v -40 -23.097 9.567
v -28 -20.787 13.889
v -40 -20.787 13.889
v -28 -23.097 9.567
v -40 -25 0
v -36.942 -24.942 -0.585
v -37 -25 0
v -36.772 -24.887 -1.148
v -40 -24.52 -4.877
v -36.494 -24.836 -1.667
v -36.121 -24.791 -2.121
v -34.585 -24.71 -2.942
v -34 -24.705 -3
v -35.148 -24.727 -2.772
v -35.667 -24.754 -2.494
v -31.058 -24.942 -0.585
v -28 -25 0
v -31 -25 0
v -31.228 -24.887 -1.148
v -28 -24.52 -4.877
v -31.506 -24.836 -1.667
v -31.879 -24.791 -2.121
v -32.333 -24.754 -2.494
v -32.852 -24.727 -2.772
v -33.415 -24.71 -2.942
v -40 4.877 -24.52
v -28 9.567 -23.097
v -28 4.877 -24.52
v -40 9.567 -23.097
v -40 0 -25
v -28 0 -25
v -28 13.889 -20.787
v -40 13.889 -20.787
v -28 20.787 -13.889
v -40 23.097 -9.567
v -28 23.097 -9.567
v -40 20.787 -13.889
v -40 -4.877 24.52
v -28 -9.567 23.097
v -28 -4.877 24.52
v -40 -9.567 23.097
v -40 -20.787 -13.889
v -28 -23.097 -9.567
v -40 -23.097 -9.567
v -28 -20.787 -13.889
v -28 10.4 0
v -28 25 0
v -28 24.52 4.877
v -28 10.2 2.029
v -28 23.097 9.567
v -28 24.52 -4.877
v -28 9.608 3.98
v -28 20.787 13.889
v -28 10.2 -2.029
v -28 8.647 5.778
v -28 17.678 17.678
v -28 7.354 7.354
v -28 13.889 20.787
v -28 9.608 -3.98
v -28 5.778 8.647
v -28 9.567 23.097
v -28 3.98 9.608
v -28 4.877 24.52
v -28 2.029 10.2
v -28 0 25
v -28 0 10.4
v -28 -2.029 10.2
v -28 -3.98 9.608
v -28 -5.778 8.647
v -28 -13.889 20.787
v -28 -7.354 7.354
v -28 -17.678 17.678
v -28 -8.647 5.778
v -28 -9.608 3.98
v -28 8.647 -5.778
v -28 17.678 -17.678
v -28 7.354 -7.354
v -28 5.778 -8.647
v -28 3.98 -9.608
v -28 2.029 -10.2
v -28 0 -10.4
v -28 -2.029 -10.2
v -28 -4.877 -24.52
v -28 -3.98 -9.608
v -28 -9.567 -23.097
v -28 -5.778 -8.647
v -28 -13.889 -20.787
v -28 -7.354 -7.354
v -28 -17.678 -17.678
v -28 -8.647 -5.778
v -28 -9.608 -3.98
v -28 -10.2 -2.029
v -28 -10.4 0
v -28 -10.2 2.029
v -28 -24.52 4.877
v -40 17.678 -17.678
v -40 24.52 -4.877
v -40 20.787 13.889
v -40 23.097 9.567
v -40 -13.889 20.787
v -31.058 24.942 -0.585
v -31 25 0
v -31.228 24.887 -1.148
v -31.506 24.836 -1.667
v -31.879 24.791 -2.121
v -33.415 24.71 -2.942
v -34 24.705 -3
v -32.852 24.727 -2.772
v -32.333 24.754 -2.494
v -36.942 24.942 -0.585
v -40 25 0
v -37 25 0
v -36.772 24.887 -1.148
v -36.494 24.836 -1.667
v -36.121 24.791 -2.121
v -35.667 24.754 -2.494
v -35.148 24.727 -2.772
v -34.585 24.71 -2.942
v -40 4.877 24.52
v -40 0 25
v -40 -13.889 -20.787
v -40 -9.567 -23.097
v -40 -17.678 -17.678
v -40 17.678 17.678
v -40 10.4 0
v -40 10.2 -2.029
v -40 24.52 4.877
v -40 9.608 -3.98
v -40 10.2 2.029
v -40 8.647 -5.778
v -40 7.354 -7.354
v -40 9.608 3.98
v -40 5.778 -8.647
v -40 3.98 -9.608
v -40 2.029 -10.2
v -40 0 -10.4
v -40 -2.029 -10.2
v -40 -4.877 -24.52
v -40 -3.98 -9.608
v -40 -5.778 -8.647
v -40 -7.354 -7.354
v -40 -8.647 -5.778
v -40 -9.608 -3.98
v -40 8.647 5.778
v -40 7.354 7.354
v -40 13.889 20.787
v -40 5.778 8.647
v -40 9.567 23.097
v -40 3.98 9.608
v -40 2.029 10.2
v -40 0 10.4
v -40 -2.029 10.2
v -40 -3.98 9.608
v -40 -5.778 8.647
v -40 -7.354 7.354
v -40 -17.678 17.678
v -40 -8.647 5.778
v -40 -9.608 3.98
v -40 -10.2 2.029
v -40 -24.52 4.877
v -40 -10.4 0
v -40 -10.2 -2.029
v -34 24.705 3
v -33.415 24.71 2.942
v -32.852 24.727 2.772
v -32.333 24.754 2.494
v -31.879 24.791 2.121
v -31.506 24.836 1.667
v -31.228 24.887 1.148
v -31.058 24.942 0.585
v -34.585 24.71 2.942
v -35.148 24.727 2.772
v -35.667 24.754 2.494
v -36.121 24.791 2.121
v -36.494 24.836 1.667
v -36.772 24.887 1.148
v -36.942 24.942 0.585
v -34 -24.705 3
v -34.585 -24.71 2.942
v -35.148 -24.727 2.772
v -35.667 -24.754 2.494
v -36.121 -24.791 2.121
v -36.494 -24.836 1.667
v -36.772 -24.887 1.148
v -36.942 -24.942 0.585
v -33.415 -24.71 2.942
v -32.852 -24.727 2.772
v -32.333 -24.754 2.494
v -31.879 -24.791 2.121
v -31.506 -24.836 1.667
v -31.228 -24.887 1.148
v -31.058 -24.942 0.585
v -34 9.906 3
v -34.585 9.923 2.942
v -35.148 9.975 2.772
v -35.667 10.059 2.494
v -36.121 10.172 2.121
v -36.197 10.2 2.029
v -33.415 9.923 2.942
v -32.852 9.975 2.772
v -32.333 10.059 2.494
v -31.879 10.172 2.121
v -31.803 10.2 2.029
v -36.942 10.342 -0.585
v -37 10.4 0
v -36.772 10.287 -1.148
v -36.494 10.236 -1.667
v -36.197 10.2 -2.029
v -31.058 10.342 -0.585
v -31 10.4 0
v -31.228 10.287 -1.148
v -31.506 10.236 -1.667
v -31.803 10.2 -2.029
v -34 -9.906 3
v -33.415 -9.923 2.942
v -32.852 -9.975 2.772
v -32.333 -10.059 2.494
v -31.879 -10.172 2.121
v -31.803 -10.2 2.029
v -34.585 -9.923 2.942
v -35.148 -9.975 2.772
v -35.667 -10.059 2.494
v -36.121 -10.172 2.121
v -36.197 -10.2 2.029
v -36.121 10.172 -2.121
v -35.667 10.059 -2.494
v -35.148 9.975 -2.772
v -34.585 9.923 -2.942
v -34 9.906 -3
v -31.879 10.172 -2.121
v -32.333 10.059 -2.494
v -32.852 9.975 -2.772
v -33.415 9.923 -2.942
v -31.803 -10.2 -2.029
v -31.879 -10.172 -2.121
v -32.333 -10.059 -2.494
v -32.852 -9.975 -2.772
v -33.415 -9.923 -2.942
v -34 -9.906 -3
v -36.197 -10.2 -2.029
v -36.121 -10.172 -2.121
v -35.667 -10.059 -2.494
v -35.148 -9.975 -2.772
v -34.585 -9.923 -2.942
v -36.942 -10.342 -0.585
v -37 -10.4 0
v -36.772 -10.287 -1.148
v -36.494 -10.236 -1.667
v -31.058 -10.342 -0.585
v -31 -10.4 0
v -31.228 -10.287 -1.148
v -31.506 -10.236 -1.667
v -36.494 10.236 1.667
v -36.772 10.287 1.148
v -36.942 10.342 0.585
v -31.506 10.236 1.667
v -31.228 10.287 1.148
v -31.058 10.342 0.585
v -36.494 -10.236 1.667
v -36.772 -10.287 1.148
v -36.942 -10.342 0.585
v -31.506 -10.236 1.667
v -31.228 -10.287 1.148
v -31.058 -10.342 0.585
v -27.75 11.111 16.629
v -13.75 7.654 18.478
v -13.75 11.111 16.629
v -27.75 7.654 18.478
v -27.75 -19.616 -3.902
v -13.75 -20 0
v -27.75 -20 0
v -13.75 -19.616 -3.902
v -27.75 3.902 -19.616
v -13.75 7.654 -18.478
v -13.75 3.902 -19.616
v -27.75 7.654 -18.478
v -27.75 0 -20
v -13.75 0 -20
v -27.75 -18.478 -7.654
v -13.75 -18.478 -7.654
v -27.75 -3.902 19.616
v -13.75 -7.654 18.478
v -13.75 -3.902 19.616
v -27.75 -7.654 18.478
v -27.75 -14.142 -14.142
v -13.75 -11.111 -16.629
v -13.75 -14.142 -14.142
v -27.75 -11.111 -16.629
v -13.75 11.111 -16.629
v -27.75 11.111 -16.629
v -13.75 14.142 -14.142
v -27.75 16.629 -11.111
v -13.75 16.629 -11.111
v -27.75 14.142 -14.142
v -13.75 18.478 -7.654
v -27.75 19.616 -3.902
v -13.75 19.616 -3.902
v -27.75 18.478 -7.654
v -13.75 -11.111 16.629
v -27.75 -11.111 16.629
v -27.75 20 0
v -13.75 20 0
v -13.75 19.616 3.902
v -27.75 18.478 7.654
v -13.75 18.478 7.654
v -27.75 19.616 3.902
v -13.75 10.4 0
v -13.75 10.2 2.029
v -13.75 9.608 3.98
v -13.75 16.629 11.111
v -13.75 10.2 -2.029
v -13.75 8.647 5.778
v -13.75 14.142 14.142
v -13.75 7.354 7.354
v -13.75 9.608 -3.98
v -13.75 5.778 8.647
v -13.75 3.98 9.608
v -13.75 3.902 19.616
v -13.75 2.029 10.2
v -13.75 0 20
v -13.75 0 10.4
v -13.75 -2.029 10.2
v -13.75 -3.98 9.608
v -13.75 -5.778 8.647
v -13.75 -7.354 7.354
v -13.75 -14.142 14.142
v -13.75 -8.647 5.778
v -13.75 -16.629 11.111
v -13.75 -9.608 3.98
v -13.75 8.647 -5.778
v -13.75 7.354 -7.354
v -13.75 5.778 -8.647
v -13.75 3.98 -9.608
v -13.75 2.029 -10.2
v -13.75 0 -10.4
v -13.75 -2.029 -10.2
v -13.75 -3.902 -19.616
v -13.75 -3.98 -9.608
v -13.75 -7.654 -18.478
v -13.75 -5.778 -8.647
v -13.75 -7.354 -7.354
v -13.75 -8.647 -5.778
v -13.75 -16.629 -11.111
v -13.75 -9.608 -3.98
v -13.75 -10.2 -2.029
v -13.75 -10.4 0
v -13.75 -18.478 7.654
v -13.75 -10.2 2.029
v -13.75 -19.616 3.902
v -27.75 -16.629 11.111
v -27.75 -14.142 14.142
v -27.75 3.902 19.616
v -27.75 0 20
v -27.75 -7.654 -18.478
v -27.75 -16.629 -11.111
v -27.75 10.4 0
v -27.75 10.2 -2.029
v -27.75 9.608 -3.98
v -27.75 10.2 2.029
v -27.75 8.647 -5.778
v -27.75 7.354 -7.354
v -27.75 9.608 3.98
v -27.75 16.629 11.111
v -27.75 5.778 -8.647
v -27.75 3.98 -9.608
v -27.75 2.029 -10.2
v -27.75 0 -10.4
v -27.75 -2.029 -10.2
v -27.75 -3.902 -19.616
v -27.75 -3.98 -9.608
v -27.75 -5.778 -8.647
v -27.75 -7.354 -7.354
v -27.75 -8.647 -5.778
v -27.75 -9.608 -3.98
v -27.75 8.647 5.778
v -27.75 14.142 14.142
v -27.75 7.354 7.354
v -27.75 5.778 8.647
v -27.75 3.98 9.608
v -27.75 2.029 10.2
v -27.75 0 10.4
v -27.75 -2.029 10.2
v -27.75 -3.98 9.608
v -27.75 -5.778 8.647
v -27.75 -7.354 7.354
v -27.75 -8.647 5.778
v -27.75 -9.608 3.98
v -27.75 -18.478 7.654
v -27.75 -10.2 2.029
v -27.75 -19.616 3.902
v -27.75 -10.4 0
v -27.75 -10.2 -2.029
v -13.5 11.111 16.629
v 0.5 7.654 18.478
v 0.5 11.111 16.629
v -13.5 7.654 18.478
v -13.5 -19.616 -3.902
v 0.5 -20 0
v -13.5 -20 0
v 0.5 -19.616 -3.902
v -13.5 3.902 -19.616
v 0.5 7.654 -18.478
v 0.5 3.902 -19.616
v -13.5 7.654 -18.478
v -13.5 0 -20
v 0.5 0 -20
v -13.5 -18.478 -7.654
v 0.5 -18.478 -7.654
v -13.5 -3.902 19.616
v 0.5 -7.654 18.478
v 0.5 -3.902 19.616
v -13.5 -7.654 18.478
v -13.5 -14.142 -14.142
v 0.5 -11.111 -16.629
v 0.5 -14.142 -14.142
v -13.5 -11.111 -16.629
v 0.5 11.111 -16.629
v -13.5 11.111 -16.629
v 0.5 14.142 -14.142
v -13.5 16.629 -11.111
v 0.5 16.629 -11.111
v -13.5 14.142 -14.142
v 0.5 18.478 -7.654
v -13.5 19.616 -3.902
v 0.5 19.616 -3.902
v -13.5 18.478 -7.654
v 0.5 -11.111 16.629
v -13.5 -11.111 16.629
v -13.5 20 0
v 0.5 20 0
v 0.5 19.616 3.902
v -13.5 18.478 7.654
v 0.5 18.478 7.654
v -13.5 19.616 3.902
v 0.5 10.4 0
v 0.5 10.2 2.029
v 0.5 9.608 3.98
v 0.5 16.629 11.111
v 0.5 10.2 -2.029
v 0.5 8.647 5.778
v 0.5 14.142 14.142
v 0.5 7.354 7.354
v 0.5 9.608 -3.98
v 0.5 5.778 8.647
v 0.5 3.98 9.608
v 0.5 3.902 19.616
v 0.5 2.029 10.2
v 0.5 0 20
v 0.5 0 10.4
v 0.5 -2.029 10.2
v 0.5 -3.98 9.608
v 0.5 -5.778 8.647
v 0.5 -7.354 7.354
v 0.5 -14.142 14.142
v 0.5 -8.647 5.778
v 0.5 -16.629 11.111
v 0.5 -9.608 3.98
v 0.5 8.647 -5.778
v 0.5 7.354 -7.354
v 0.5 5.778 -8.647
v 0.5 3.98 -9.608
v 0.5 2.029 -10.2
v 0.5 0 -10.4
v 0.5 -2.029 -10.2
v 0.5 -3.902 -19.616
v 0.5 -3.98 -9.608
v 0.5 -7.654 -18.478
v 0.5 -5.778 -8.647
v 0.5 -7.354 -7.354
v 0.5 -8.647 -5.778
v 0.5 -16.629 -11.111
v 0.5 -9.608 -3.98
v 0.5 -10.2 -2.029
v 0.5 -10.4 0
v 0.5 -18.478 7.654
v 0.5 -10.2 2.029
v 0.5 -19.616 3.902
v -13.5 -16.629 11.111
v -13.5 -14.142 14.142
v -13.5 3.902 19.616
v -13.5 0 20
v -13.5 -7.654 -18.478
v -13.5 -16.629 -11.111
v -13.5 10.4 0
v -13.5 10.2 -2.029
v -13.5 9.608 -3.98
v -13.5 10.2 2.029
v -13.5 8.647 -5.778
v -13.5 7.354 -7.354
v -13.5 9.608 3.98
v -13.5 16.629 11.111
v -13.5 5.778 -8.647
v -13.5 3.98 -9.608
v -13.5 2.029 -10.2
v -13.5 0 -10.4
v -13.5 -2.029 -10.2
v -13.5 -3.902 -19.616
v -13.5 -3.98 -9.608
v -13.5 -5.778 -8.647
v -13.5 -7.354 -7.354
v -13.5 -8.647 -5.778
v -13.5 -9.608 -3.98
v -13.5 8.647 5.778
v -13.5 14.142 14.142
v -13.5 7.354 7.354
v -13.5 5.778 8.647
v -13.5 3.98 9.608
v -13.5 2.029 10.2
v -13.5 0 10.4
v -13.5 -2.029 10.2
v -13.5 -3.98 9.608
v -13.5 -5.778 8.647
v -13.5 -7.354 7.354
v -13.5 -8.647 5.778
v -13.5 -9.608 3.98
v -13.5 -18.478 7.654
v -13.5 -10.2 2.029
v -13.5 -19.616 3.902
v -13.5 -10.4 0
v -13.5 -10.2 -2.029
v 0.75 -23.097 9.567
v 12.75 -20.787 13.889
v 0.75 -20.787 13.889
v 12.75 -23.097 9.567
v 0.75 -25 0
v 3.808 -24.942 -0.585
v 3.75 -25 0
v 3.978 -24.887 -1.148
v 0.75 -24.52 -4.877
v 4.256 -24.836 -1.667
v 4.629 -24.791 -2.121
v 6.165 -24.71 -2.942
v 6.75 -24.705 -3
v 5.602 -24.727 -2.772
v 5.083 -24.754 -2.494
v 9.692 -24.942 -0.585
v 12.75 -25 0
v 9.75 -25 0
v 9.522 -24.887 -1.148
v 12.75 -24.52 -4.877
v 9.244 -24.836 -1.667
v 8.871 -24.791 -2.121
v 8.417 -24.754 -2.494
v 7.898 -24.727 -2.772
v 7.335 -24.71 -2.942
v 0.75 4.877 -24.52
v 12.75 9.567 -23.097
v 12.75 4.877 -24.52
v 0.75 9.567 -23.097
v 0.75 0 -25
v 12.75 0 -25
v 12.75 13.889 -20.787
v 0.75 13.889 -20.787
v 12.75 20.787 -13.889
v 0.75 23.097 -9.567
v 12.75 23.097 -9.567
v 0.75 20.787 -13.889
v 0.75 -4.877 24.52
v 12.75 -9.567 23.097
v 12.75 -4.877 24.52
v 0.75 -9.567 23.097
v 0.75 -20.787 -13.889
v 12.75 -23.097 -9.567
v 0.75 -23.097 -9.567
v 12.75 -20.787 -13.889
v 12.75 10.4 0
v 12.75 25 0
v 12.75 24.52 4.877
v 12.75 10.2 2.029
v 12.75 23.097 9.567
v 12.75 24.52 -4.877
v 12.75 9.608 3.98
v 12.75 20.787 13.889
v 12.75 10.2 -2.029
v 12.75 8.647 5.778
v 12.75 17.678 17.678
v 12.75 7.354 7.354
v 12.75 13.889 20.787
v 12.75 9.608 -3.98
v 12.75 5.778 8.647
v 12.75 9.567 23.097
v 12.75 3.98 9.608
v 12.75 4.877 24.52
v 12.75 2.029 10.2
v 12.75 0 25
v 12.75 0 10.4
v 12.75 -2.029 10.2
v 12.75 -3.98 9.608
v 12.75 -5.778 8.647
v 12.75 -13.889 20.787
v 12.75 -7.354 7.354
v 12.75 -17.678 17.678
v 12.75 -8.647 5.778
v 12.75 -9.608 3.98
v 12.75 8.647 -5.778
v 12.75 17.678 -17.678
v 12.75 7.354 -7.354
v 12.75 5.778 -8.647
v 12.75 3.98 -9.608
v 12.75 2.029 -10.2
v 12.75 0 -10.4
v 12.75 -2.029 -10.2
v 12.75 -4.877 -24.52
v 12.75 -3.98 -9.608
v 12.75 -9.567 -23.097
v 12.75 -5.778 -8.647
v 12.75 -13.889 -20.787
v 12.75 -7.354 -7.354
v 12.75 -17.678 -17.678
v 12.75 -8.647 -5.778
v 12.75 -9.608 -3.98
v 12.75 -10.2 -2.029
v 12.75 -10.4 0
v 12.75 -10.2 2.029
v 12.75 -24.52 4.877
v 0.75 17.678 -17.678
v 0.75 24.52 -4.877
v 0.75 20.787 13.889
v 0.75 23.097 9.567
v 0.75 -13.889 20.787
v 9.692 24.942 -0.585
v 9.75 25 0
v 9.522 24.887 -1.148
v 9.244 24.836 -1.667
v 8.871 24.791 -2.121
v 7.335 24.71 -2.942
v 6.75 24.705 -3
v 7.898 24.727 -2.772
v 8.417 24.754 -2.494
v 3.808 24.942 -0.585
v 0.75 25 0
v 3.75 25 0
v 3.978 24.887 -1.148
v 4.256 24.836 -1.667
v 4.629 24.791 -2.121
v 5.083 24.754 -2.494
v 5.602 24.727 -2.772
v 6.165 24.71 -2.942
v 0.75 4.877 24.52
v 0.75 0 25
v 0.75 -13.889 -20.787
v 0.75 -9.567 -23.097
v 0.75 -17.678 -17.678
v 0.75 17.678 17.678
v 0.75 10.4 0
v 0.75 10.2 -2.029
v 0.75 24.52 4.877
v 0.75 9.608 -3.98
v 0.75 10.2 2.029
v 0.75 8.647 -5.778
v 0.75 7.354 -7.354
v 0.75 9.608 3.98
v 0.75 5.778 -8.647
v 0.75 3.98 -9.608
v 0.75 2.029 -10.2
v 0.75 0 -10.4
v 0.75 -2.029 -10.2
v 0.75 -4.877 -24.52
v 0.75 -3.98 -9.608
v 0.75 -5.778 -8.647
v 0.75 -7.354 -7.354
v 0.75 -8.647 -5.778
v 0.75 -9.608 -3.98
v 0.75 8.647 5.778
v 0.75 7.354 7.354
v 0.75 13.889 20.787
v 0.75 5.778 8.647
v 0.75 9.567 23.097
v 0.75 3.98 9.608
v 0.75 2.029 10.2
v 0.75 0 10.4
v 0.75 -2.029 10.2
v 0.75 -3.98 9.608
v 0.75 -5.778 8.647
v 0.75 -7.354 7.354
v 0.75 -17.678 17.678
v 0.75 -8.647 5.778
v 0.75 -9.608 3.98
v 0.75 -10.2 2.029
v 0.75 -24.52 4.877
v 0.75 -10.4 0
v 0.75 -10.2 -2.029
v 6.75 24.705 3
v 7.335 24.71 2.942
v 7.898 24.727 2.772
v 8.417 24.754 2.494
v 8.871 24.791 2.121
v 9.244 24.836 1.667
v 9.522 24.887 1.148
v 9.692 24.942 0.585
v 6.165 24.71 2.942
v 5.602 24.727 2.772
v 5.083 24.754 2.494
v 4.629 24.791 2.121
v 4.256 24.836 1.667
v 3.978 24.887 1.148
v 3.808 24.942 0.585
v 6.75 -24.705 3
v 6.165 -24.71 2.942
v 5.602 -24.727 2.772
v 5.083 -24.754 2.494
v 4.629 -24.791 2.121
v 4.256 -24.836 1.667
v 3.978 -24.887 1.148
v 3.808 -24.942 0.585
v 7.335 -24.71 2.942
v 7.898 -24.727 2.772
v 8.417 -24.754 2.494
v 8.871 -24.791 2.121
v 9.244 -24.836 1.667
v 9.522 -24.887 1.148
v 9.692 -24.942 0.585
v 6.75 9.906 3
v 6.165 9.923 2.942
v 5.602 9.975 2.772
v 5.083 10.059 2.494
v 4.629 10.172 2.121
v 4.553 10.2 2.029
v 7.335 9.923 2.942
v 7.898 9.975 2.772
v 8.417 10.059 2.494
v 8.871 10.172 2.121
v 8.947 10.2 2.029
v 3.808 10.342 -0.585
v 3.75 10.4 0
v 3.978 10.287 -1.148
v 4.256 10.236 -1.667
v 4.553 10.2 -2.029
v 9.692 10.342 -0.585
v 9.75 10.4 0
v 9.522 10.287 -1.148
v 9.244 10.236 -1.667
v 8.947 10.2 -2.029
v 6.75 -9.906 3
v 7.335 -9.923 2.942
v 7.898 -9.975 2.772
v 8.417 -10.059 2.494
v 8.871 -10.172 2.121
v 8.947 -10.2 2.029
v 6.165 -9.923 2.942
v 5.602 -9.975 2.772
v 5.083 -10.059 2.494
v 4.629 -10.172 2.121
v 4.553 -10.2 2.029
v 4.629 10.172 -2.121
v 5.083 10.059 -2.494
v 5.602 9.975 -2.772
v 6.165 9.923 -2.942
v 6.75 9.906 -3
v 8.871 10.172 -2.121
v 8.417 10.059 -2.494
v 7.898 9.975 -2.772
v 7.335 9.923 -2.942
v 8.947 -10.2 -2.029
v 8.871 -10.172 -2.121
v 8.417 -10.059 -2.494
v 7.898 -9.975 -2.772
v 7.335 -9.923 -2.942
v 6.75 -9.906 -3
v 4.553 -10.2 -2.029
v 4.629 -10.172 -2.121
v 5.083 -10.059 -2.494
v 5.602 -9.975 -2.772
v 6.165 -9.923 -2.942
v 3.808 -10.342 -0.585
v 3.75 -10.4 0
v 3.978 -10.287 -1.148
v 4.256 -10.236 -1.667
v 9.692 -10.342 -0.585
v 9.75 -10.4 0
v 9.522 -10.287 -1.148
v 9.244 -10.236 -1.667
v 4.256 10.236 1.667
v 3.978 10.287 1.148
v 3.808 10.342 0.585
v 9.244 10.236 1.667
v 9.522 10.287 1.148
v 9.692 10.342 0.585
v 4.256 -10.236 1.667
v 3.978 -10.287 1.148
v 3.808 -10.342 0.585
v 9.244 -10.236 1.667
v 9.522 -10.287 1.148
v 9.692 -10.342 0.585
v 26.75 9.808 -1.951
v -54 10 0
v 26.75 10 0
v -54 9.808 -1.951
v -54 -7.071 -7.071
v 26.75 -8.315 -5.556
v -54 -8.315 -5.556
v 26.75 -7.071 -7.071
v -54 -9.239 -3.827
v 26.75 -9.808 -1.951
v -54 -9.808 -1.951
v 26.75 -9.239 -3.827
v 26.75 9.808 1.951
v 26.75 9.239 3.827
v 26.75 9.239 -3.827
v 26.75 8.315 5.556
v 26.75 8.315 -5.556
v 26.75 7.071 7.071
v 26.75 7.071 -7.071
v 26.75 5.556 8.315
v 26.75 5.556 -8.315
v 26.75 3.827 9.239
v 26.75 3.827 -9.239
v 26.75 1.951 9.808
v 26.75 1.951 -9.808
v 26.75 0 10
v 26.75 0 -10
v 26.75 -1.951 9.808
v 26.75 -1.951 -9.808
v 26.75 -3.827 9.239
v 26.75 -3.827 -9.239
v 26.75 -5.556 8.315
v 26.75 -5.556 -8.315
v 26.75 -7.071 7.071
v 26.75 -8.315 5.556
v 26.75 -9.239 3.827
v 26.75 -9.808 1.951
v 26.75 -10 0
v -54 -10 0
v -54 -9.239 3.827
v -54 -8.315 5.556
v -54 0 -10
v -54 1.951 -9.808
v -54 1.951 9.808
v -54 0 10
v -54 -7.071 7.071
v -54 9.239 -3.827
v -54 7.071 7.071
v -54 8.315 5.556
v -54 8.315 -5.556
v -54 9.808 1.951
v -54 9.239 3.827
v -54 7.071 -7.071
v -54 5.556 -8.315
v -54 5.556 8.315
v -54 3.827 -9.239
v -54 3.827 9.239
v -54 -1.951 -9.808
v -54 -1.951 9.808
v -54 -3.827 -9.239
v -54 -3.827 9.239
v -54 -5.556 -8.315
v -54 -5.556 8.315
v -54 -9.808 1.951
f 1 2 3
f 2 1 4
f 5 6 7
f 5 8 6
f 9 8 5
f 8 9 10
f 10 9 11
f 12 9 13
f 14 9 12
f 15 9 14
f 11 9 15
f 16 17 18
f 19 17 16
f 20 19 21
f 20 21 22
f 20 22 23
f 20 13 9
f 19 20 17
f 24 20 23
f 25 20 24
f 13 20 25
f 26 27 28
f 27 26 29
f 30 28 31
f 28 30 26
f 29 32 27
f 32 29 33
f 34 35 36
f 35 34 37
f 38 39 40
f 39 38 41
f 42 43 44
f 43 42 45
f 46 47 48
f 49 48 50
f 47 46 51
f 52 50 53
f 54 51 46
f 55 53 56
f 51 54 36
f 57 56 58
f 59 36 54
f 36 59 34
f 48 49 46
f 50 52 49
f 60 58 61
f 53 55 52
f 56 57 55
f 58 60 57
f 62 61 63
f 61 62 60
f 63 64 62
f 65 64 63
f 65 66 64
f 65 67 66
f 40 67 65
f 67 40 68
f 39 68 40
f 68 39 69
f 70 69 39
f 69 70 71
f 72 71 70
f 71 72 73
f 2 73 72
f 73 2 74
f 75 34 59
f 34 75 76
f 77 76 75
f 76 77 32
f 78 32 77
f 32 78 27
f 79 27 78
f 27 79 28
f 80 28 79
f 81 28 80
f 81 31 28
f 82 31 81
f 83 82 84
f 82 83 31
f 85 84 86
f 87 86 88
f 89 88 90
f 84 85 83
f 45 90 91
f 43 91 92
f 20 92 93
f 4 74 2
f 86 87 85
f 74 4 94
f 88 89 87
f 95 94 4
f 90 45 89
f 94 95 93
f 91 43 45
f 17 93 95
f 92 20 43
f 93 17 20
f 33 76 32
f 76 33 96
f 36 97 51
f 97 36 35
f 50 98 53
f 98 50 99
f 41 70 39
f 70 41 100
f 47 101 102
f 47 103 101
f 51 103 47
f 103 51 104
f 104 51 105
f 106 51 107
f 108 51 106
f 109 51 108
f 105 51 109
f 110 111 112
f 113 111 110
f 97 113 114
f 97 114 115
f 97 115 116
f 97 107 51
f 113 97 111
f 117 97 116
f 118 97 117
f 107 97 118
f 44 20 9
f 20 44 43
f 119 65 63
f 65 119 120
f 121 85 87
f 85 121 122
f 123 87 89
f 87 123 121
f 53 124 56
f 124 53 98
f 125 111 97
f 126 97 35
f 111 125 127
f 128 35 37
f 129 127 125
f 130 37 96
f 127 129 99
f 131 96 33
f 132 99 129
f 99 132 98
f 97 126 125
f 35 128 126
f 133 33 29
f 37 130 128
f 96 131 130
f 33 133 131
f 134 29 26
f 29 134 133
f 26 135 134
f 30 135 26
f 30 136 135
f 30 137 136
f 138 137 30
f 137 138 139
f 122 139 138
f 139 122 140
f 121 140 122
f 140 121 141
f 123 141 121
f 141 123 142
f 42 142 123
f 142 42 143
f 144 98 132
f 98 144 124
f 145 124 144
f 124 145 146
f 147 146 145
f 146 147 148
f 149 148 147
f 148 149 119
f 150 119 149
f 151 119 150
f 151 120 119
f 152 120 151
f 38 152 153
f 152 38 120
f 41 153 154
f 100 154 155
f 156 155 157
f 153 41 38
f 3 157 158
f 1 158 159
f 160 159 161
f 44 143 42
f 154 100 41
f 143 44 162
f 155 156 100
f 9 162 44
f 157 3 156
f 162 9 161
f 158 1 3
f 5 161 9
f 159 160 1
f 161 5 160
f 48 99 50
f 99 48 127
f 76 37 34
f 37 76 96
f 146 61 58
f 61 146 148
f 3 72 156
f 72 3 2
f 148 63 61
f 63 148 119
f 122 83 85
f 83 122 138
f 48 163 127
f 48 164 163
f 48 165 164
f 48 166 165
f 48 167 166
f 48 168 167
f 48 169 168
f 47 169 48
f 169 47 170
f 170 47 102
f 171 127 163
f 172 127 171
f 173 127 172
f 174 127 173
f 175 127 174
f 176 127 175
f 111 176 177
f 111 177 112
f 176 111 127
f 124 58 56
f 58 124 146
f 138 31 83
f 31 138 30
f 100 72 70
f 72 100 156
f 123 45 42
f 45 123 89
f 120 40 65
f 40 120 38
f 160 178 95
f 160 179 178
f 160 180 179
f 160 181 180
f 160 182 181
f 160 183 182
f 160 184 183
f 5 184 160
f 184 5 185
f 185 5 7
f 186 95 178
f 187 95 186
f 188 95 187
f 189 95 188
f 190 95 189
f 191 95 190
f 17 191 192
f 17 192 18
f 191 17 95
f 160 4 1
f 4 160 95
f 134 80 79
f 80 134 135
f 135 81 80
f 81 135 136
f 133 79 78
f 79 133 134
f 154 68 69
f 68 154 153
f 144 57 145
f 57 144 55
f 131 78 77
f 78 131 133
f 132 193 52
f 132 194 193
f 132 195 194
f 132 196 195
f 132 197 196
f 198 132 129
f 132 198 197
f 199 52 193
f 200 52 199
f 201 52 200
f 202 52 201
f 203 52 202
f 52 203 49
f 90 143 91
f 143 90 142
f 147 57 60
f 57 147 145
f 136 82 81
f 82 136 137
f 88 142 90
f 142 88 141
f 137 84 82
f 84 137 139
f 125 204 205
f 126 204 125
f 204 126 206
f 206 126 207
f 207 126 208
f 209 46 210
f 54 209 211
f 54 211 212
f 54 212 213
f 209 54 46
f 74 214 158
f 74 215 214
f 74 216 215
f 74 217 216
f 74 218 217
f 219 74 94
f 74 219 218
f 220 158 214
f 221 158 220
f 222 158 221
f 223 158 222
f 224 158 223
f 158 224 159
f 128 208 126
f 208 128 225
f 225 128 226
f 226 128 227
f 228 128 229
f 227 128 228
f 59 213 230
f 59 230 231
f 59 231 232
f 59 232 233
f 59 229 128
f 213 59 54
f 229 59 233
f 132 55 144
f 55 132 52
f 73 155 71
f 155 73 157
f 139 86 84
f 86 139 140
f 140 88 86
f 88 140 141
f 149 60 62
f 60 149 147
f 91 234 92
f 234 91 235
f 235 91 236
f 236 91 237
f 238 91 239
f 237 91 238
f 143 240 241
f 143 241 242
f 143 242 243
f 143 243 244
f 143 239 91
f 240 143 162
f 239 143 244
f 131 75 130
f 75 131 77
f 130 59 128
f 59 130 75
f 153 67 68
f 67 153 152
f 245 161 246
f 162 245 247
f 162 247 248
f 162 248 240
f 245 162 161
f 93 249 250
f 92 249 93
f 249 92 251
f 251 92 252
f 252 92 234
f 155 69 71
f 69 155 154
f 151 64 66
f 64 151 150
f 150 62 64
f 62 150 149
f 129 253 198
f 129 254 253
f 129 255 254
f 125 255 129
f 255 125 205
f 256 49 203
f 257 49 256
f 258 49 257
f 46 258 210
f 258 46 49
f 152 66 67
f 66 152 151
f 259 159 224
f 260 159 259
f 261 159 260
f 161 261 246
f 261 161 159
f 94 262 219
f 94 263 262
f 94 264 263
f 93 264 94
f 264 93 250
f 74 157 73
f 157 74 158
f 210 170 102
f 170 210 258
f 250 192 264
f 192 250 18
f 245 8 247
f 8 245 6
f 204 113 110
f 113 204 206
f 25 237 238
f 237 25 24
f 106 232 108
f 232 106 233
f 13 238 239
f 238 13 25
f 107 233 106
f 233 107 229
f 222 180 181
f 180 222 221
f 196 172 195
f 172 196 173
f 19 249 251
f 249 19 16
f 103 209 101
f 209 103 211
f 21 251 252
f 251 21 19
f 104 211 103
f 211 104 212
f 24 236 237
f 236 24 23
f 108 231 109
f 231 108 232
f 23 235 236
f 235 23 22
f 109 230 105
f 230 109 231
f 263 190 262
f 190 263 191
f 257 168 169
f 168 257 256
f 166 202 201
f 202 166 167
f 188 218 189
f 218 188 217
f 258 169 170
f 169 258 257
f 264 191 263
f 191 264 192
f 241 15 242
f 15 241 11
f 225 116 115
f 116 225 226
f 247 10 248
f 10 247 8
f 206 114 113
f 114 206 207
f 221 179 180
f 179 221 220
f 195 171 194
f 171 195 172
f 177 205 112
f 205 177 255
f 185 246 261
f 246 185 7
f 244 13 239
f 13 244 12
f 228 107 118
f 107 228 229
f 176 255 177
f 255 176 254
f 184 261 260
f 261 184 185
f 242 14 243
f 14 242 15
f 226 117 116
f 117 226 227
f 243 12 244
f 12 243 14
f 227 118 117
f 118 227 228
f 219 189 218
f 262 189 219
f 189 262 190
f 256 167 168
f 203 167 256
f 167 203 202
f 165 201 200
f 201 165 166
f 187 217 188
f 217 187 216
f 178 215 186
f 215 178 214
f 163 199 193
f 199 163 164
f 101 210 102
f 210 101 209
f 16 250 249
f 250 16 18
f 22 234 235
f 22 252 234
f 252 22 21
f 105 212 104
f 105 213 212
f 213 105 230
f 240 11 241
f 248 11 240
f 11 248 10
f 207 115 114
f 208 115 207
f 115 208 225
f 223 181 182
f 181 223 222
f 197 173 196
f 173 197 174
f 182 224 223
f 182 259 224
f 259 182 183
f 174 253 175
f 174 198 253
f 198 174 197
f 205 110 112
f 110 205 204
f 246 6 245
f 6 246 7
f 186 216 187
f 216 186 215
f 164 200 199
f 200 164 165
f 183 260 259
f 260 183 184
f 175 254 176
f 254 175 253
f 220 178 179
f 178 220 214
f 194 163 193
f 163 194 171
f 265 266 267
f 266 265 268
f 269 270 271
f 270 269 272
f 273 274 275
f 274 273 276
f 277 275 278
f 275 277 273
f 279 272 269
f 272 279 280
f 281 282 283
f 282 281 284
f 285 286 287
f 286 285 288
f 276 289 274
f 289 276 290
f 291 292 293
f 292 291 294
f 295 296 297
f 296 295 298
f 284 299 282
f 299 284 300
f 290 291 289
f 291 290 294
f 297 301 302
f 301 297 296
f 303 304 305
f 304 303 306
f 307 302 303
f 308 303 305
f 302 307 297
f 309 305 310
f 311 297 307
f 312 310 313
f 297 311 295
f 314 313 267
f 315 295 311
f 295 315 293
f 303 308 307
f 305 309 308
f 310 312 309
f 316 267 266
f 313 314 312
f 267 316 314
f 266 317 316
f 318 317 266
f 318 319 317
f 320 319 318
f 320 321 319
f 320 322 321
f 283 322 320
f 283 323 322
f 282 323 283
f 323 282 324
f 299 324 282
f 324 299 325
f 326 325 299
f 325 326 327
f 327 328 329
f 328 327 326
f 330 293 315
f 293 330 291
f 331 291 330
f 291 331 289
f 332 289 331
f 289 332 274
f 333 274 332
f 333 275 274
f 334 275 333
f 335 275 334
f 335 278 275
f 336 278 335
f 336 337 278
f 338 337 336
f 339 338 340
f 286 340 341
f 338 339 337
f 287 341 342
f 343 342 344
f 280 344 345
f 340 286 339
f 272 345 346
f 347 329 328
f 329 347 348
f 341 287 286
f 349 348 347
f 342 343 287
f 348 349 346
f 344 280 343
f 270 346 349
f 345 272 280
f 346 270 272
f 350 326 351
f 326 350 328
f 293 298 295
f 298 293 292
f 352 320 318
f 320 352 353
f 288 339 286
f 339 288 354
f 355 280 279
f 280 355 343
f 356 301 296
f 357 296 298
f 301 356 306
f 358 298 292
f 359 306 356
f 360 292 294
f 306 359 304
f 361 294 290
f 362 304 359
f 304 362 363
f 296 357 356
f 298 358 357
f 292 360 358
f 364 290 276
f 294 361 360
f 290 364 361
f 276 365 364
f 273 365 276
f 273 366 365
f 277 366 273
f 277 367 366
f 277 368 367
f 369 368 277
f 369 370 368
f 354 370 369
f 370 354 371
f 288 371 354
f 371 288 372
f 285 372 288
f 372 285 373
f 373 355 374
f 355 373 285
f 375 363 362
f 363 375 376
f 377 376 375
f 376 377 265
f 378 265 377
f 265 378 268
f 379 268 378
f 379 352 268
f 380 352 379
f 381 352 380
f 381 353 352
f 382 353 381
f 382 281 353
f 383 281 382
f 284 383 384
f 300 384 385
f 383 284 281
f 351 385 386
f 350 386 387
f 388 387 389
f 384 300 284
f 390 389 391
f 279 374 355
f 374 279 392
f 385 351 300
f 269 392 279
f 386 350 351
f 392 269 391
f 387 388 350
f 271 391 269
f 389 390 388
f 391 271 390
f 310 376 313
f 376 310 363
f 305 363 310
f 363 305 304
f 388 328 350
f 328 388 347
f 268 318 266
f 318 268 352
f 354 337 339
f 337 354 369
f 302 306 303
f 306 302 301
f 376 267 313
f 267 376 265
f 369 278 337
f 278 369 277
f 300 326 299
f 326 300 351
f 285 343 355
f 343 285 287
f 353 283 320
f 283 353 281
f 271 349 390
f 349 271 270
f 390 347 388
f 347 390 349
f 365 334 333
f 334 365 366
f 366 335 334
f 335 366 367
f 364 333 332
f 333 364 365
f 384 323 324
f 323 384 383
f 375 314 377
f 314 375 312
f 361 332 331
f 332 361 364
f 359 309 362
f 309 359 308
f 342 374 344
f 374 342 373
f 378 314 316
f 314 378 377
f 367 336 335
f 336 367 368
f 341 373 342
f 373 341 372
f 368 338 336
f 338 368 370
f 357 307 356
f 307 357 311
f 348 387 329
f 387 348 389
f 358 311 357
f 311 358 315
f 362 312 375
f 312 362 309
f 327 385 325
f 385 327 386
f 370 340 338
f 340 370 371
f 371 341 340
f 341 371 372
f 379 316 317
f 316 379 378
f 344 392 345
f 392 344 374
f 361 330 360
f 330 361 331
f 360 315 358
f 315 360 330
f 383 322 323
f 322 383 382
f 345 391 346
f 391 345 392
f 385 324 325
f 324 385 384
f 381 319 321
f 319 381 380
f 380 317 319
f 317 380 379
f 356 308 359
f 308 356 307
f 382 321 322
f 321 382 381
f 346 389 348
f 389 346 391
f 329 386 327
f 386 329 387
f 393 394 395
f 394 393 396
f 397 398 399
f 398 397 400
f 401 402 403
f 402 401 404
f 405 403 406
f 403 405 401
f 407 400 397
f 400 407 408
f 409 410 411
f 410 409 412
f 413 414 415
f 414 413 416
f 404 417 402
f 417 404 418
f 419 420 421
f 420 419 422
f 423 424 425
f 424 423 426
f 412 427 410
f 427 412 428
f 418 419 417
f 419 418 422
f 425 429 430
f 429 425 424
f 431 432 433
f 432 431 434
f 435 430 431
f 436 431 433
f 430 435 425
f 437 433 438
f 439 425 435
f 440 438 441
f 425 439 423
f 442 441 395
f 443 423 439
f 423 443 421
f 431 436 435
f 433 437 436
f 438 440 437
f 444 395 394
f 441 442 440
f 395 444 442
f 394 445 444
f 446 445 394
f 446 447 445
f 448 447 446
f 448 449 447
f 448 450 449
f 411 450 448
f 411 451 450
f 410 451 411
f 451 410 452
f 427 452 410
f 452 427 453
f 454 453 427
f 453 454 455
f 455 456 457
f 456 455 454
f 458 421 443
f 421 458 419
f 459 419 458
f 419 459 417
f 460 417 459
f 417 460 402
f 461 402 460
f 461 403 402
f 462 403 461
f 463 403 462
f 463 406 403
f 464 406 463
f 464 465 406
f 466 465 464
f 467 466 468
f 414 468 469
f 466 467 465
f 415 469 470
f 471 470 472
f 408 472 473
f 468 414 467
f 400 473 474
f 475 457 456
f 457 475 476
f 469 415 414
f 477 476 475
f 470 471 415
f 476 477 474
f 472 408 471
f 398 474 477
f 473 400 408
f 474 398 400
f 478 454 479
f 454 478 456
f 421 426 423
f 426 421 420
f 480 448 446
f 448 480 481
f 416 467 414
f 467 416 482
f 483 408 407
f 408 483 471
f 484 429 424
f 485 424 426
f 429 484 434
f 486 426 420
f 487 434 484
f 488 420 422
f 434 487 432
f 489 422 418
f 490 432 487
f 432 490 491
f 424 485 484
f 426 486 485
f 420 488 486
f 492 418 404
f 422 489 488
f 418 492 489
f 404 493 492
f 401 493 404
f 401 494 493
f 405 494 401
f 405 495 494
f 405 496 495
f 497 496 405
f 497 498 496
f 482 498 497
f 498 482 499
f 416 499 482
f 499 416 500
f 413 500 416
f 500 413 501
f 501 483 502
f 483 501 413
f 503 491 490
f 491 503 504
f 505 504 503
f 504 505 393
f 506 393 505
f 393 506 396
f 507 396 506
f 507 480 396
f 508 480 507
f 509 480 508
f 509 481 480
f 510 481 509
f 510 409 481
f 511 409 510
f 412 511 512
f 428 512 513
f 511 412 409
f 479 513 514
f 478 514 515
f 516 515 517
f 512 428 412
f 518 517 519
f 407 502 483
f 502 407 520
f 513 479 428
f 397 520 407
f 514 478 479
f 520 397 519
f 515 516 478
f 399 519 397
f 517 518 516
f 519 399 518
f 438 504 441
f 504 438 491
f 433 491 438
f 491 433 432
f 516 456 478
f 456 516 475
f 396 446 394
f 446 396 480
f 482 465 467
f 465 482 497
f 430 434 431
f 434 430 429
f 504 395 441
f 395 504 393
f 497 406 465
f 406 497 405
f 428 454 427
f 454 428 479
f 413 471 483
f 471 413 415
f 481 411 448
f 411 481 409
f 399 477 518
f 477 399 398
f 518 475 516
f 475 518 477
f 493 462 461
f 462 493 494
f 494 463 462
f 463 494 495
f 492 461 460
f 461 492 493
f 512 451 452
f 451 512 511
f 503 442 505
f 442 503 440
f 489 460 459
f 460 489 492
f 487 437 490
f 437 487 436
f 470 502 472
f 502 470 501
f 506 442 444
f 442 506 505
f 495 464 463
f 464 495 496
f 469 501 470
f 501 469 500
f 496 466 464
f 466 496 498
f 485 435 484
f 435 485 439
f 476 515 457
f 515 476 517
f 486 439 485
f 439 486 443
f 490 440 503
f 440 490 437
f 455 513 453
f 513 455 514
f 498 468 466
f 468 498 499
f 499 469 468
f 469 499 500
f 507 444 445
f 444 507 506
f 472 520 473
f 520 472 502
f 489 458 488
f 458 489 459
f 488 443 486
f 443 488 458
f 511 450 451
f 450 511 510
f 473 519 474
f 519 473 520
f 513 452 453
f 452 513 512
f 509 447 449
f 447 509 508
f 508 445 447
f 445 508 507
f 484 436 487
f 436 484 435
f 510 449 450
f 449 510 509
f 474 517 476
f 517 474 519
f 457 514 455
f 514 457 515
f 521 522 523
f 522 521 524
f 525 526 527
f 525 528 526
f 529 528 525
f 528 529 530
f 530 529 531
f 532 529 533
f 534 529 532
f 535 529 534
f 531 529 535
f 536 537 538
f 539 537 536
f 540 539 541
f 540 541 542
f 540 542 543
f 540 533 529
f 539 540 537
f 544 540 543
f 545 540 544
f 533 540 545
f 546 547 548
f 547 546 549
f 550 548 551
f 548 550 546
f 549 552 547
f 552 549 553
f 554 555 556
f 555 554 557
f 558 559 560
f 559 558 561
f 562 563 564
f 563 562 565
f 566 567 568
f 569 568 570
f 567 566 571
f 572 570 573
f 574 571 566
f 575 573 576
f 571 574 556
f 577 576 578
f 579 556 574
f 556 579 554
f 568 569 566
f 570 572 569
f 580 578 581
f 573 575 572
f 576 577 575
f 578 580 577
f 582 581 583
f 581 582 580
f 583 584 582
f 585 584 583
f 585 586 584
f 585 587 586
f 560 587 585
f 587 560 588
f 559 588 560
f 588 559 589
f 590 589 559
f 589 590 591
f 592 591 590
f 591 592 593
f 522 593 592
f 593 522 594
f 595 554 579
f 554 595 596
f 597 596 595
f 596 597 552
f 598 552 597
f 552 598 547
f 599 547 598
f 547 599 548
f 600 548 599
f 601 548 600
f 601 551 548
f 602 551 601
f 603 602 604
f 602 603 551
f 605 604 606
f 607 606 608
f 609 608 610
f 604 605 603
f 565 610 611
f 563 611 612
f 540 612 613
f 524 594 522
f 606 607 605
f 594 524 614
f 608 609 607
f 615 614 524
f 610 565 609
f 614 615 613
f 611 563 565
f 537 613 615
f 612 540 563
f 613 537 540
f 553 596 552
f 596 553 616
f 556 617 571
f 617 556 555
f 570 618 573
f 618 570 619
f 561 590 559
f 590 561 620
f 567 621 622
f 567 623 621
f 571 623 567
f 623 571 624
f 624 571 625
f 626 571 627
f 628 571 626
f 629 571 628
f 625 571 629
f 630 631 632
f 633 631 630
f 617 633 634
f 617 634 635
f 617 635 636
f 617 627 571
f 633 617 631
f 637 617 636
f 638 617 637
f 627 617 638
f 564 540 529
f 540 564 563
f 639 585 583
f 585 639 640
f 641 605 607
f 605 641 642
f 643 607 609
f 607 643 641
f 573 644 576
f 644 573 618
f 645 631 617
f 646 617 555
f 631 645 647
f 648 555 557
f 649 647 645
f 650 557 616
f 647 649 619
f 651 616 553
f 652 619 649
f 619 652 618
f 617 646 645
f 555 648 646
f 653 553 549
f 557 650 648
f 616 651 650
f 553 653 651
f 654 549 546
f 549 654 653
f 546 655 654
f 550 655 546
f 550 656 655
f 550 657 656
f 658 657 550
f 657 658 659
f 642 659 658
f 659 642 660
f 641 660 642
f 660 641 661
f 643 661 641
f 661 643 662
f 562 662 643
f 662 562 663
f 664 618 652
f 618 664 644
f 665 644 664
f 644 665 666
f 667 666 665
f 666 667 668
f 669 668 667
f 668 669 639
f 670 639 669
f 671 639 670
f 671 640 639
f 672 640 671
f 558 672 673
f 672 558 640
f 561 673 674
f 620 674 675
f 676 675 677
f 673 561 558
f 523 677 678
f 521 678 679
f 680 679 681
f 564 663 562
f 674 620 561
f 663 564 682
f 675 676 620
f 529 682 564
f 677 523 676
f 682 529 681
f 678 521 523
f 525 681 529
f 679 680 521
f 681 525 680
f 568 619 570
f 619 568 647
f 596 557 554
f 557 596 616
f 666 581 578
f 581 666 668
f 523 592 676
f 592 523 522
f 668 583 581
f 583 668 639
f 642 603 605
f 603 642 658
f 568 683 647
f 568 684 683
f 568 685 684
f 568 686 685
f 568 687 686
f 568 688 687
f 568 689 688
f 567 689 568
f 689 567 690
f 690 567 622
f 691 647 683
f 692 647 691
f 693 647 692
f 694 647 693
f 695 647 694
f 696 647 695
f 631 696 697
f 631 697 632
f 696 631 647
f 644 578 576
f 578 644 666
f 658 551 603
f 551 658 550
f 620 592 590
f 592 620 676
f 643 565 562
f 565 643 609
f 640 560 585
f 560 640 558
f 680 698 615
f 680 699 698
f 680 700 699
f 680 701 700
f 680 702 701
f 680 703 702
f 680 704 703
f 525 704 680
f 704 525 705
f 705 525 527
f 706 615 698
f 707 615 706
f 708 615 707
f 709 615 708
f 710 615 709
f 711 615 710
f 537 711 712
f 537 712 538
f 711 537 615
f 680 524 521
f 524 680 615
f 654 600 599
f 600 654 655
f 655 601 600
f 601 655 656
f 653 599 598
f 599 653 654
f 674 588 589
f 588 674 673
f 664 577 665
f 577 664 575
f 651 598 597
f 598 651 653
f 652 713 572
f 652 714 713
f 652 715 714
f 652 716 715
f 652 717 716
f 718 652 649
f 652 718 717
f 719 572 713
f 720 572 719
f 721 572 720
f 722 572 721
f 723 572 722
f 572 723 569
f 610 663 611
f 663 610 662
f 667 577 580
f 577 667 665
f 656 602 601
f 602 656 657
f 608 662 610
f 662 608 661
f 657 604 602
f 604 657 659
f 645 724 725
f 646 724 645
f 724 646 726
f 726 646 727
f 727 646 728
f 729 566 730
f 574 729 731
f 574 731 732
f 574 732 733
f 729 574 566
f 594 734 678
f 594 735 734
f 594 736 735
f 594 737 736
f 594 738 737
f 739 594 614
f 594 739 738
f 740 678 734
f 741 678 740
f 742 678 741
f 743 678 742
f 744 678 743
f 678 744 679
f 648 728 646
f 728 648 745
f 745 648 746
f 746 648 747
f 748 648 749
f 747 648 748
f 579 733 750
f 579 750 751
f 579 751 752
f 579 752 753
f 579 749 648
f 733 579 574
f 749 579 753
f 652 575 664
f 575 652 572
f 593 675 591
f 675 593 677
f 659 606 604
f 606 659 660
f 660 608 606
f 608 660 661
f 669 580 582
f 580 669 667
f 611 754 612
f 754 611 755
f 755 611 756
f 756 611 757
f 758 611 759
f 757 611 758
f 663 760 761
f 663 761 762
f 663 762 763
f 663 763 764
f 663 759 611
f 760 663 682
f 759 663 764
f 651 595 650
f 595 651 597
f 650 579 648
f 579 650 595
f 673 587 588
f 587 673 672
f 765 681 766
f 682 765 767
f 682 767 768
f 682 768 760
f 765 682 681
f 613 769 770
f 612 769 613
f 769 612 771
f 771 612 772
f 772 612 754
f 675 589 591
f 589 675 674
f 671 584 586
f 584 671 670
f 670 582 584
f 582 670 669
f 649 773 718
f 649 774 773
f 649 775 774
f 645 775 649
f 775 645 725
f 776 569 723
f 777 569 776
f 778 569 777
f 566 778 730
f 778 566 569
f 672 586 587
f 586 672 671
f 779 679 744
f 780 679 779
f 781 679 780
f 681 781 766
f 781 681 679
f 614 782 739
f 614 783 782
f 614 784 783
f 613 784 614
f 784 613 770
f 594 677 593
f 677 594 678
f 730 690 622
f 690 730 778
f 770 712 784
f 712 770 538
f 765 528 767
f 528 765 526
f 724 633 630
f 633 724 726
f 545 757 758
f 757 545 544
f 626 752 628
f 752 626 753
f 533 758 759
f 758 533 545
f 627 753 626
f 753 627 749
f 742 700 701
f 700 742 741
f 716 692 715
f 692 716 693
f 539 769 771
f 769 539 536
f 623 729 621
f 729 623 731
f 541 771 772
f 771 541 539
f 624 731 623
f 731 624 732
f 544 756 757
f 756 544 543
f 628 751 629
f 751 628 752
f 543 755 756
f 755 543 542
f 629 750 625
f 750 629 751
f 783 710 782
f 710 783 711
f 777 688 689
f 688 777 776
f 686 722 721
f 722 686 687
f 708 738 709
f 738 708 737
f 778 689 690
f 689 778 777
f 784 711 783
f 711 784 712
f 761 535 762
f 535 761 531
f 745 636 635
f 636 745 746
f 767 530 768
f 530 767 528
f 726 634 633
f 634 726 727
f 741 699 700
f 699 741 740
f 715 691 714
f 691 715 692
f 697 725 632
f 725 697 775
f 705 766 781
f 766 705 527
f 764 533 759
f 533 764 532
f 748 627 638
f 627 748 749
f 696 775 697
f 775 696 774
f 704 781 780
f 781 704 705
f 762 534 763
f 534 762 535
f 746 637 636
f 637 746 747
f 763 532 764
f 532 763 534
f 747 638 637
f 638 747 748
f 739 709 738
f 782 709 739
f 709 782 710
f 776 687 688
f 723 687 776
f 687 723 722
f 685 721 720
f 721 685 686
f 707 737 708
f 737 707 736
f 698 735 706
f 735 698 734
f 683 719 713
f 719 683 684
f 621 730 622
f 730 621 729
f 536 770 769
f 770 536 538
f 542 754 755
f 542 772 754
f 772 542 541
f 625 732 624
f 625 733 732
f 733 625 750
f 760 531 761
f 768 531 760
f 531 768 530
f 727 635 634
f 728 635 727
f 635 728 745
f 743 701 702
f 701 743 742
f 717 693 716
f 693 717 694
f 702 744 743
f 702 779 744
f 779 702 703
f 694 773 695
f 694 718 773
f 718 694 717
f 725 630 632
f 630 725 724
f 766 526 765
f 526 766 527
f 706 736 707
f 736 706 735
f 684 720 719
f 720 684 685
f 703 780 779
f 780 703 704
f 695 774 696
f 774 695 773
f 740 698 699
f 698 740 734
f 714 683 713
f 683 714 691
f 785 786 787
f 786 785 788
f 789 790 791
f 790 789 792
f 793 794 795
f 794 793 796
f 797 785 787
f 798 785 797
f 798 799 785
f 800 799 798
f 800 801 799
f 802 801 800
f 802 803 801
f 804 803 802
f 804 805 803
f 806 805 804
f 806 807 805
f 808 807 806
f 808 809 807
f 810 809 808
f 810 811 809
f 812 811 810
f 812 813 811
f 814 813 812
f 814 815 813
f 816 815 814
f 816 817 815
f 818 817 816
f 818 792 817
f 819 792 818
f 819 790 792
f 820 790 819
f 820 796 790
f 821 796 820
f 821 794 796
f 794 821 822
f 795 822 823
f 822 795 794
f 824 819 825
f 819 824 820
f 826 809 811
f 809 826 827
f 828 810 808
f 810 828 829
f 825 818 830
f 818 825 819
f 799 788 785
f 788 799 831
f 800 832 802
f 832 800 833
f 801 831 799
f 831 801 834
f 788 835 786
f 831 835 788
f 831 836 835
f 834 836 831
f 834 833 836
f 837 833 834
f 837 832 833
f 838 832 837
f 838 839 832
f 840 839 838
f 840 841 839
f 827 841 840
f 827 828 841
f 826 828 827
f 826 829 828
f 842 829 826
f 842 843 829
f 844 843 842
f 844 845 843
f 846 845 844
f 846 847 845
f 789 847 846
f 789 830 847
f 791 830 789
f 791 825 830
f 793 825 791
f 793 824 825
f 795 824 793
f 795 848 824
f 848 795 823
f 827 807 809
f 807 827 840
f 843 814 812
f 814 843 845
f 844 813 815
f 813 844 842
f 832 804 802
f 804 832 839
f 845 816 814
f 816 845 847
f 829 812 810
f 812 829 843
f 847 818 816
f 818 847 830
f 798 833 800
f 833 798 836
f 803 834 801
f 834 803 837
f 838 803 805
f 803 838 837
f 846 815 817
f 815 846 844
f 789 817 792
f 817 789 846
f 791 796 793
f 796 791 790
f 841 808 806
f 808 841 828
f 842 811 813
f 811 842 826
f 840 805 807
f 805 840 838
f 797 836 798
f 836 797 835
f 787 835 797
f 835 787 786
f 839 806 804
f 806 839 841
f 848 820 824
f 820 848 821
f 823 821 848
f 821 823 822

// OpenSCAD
$fn = 32;

// ------------------------------------------------------------------------
// Shaft with rings and collars: d20 shaft, 4 rings
// Every part is its own module, assembly() places them once.
// ------------------------------------------------------------------------

// --- part 1 ---
module shaft() {
  translate([0, 0, -40.375]) cylinder(h = 80.75, d = 20);
}

// --- part 2 ---
module collar_a() {
  difference() {
    cylinder(h = 12, d = 50);
    translate([0, 0, -1]) cylinder(h = 14, d = 20.8);
    translate([0, 0, 6]) rotate([90, 0, 0]) cylinder(h = 52, d = 6, center = true);
  }
}

// --- part 3 ---
module spacer_a() {
  difference() {
      translate([0, 0, 0]) cylinder(h = 14, d = 40);
      translate([0, 0, -1]) cylinder(h = 16, d = 20.8);
    }
}

// --- part 4 ---
module spacer_b() {
  difference() {
      translate([0, 0, 0]) cylinder(h = 14, d = 40);
      translate([0, 0, -1]) cylinder(h = 16, d = 20.8);
    }
}

// --- part 5 ---
module collar_b() {
  difference() {
    cylinder(h = 12, d = 50);
    translate([0, 0, -1]) cylinder(h = 14, d = 20.8);
    translate([0, 0, 6]) rotate([90, 0, 0]) cylinder(h = 52, d = 6, center = true);
  }
}

// --- assembly ---
module assembly() {
  translate([-13.625, 0, 0]) rotate([0, 90, 0]) shaft();
  translate([-40, 0, 0]) rotate([0, 90, 0]) collar_a();
  translate([-27.75, 0, 0]) rotate([0, 90, 0]) spacer_a();
  translate([-13.5, 0, 0]) rotate([0, 90, 0]) spacer_b();
  translate([0.75, 0, 0]) rotate([0, 90, 0]) collar_b();
}

assembly();
